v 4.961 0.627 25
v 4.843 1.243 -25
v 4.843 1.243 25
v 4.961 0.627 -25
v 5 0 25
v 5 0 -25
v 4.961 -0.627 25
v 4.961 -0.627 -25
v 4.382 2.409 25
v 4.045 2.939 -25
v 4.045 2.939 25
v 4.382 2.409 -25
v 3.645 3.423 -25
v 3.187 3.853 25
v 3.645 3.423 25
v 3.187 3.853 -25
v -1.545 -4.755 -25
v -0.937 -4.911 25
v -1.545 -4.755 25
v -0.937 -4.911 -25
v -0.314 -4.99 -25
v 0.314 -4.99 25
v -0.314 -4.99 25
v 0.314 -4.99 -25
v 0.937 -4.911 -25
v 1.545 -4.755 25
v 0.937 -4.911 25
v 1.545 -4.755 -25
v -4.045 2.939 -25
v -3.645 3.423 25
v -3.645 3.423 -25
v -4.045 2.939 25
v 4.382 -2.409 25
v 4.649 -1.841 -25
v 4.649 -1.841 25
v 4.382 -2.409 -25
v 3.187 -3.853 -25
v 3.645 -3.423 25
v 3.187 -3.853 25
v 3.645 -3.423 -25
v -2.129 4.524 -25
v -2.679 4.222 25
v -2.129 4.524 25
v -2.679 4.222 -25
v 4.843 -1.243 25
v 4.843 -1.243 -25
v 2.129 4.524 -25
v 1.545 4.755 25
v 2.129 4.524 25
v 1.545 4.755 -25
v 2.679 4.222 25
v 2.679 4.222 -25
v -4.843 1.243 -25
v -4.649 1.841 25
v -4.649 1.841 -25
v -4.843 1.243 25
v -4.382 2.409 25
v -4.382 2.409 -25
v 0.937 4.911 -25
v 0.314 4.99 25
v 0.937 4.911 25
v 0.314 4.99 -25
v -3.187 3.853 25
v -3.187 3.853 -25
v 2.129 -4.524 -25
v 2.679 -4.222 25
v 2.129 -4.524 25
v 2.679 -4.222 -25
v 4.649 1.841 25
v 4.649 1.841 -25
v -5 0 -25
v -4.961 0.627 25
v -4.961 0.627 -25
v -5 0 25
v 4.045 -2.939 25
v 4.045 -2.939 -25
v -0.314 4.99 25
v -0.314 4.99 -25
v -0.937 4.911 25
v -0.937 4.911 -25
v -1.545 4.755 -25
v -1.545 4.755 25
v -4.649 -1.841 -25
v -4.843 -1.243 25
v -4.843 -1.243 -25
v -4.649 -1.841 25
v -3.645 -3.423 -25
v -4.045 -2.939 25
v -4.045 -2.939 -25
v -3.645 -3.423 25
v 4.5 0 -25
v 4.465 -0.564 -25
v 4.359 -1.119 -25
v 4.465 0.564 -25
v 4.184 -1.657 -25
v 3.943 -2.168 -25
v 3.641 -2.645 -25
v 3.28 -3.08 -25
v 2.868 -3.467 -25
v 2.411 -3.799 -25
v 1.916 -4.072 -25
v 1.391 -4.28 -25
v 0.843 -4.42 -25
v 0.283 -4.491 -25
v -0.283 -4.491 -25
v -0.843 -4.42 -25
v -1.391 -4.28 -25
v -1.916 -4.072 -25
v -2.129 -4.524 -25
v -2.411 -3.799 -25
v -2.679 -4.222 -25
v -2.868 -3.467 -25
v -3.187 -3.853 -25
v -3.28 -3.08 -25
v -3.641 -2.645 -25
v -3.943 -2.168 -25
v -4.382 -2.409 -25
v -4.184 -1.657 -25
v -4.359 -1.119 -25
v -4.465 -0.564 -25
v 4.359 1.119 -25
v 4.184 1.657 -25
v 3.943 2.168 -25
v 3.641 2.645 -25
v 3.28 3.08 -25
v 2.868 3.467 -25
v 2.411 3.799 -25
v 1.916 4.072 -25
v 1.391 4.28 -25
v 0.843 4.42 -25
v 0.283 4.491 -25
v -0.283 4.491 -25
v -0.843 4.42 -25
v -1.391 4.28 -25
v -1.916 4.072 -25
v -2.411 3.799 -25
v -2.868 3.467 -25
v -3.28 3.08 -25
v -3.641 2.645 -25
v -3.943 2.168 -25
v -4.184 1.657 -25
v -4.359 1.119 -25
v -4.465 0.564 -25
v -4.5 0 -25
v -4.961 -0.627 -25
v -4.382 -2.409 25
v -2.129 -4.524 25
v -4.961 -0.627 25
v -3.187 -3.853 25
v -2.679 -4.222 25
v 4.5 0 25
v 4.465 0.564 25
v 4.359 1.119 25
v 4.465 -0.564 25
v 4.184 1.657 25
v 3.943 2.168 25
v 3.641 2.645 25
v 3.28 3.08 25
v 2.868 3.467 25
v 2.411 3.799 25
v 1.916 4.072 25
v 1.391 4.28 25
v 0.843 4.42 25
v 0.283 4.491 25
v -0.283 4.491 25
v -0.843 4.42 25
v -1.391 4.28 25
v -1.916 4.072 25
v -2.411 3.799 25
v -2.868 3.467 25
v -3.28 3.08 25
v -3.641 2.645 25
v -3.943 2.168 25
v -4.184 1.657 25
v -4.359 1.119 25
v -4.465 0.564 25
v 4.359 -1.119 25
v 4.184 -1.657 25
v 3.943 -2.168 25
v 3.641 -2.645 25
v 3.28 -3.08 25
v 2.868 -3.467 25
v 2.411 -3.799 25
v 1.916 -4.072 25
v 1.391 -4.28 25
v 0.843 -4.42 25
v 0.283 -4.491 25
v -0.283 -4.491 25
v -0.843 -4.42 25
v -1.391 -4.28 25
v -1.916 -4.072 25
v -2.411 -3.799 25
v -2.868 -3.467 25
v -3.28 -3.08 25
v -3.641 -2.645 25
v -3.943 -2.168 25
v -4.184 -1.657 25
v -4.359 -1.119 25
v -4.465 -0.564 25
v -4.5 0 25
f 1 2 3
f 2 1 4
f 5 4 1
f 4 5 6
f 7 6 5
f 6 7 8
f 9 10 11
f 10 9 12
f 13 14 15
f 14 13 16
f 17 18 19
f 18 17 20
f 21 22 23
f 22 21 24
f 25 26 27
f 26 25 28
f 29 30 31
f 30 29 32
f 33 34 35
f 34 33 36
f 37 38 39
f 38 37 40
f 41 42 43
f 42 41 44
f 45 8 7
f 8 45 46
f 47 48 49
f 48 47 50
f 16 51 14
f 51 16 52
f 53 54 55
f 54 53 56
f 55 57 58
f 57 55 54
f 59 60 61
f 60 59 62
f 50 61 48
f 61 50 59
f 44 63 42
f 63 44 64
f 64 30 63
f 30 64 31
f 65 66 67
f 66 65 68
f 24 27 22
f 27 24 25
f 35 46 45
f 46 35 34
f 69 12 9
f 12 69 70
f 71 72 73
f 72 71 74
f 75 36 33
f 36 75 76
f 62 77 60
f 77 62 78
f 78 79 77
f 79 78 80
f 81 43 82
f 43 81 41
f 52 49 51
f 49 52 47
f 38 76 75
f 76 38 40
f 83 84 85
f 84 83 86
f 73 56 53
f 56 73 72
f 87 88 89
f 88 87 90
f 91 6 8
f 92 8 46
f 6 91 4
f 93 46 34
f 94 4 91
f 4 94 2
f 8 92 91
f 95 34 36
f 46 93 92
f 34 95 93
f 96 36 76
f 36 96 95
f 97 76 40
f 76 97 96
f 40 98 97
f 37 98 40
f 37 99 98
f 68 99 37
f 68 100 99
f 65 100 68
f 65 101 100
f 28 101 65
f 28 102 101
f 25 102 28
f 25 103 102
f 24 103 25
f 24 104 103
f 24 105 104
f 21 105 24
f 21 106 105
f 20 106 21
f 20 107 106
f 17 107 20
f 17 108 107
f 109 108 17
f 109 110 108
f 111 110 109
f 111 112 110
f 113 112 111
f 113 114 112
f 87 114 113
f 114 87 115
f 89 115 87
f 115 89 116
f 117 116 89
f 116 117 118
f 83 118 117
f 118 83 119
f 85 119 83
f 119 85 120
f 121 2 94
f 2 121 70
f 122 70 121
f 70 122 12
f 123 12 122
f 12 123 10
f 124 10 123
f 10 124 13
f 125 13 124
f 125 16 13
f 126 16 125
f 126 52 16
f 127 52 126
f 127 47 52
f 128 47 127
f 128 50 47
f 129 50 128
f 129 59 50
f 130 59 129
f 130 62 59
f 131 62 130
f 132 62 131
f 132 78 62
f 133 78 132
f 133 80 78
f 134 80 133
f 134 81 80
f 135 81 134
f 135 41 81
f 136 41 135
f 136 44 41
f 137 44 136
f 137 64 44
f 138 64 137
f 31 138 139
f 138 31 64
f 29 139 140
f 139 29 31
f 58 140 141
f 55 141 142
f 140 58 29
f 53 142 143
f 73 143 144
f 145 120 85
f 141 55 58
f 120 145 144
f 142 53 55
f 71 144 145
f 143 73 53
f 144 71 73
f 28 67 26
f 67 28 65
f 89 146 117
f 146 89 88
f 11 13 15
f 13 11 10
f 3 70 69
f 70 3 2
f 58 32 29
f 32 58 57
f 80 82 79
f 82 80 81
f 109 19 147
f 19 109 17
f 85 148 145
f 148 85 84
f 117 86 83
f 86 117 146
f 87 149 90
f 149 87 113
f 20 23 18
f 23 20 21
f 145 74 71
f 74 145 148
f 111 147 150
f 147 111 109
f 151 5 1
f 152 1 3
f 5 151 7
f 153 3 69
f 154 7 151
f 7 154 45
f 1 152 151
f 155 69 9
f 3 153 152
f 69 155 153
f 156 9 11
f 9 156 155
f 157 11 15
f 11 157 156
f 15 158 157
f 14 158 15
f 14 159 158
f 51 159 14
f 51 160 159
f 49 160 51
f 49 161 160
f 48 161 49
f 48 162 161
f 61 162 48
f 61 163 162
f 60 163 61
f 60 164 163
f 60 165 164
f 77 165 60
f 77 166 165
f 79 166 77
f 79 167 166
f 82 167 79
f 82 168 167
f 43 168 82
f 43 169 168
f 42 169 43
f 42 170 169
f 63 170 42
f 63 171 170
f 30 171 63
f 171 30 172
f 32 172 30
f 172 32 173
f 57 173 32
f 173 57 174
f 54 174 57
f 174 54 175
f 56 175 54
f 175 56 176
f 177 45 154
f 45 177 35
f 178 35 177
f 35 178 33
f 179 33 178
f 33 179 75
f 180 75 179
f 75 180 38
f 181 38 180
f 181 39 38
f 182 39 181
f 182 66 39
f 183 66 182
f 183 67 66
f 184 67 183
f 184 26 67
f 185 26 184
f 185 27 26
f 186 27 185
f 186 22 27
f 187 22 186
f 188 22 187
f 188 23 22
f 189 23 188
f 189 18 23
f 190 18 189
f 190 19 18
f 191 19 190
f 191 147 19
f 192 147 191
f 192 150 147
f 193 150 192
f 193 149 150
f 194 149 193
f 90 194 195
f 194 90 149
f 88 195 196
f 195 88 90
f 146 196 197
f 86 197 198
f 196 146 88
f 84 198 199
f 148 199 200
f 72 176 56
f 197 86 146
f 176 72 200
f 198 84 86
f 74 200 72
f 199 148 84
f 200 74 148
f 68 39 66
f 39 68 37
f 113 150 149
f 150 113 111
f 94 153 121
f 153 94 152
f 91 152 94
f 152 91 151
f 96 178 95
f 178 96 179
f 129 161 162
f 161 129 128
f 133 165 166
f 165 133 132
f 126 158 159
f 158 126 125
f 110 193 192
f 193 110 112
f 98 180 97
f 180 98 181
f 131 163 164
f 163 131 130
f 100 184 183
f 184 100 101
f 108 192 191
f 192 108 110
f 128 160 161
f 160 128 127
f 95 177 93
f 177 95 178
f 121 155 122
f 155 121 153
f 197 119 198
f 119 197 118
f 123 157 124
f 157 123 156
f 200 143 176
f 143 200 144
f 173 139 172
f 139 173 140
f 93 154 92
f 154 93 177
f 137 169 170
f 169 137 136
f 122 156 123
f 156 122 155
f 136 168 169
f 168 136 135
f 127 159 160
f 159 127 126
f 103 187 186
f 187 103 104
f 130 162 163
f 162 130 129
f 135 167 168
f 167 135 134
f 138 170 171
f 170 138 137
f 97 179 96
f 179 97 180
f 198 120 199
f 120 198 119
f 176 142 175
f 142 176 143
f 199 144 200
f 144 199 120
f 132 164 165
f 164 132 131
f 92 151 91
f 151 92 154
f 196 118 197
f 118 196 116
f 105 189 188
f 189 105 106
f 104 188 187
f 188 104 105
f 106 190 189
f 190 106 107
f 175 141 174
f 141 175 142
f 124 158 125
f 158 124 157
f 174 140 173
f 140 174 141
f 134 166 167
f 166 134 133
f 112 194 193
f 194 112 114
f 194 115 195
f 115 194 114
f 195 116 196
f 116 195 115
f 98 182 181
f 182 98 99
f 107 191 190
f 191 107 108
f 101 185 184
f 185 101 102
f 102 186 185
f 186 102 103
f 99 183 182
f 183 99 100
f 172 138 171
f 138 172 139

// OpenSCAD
$fn = 50;


difference() {
	union() {
		translate(v = [0, 0, -25.0000000000]) {
			cylinder(h = 50, r = 5.0000000000);
		}
	}
	union() {
		translate(v = [0, 0, -100.0000000000]) {
			cylinder(h = 200, r = 4.5000000000);
		}
	}
}
